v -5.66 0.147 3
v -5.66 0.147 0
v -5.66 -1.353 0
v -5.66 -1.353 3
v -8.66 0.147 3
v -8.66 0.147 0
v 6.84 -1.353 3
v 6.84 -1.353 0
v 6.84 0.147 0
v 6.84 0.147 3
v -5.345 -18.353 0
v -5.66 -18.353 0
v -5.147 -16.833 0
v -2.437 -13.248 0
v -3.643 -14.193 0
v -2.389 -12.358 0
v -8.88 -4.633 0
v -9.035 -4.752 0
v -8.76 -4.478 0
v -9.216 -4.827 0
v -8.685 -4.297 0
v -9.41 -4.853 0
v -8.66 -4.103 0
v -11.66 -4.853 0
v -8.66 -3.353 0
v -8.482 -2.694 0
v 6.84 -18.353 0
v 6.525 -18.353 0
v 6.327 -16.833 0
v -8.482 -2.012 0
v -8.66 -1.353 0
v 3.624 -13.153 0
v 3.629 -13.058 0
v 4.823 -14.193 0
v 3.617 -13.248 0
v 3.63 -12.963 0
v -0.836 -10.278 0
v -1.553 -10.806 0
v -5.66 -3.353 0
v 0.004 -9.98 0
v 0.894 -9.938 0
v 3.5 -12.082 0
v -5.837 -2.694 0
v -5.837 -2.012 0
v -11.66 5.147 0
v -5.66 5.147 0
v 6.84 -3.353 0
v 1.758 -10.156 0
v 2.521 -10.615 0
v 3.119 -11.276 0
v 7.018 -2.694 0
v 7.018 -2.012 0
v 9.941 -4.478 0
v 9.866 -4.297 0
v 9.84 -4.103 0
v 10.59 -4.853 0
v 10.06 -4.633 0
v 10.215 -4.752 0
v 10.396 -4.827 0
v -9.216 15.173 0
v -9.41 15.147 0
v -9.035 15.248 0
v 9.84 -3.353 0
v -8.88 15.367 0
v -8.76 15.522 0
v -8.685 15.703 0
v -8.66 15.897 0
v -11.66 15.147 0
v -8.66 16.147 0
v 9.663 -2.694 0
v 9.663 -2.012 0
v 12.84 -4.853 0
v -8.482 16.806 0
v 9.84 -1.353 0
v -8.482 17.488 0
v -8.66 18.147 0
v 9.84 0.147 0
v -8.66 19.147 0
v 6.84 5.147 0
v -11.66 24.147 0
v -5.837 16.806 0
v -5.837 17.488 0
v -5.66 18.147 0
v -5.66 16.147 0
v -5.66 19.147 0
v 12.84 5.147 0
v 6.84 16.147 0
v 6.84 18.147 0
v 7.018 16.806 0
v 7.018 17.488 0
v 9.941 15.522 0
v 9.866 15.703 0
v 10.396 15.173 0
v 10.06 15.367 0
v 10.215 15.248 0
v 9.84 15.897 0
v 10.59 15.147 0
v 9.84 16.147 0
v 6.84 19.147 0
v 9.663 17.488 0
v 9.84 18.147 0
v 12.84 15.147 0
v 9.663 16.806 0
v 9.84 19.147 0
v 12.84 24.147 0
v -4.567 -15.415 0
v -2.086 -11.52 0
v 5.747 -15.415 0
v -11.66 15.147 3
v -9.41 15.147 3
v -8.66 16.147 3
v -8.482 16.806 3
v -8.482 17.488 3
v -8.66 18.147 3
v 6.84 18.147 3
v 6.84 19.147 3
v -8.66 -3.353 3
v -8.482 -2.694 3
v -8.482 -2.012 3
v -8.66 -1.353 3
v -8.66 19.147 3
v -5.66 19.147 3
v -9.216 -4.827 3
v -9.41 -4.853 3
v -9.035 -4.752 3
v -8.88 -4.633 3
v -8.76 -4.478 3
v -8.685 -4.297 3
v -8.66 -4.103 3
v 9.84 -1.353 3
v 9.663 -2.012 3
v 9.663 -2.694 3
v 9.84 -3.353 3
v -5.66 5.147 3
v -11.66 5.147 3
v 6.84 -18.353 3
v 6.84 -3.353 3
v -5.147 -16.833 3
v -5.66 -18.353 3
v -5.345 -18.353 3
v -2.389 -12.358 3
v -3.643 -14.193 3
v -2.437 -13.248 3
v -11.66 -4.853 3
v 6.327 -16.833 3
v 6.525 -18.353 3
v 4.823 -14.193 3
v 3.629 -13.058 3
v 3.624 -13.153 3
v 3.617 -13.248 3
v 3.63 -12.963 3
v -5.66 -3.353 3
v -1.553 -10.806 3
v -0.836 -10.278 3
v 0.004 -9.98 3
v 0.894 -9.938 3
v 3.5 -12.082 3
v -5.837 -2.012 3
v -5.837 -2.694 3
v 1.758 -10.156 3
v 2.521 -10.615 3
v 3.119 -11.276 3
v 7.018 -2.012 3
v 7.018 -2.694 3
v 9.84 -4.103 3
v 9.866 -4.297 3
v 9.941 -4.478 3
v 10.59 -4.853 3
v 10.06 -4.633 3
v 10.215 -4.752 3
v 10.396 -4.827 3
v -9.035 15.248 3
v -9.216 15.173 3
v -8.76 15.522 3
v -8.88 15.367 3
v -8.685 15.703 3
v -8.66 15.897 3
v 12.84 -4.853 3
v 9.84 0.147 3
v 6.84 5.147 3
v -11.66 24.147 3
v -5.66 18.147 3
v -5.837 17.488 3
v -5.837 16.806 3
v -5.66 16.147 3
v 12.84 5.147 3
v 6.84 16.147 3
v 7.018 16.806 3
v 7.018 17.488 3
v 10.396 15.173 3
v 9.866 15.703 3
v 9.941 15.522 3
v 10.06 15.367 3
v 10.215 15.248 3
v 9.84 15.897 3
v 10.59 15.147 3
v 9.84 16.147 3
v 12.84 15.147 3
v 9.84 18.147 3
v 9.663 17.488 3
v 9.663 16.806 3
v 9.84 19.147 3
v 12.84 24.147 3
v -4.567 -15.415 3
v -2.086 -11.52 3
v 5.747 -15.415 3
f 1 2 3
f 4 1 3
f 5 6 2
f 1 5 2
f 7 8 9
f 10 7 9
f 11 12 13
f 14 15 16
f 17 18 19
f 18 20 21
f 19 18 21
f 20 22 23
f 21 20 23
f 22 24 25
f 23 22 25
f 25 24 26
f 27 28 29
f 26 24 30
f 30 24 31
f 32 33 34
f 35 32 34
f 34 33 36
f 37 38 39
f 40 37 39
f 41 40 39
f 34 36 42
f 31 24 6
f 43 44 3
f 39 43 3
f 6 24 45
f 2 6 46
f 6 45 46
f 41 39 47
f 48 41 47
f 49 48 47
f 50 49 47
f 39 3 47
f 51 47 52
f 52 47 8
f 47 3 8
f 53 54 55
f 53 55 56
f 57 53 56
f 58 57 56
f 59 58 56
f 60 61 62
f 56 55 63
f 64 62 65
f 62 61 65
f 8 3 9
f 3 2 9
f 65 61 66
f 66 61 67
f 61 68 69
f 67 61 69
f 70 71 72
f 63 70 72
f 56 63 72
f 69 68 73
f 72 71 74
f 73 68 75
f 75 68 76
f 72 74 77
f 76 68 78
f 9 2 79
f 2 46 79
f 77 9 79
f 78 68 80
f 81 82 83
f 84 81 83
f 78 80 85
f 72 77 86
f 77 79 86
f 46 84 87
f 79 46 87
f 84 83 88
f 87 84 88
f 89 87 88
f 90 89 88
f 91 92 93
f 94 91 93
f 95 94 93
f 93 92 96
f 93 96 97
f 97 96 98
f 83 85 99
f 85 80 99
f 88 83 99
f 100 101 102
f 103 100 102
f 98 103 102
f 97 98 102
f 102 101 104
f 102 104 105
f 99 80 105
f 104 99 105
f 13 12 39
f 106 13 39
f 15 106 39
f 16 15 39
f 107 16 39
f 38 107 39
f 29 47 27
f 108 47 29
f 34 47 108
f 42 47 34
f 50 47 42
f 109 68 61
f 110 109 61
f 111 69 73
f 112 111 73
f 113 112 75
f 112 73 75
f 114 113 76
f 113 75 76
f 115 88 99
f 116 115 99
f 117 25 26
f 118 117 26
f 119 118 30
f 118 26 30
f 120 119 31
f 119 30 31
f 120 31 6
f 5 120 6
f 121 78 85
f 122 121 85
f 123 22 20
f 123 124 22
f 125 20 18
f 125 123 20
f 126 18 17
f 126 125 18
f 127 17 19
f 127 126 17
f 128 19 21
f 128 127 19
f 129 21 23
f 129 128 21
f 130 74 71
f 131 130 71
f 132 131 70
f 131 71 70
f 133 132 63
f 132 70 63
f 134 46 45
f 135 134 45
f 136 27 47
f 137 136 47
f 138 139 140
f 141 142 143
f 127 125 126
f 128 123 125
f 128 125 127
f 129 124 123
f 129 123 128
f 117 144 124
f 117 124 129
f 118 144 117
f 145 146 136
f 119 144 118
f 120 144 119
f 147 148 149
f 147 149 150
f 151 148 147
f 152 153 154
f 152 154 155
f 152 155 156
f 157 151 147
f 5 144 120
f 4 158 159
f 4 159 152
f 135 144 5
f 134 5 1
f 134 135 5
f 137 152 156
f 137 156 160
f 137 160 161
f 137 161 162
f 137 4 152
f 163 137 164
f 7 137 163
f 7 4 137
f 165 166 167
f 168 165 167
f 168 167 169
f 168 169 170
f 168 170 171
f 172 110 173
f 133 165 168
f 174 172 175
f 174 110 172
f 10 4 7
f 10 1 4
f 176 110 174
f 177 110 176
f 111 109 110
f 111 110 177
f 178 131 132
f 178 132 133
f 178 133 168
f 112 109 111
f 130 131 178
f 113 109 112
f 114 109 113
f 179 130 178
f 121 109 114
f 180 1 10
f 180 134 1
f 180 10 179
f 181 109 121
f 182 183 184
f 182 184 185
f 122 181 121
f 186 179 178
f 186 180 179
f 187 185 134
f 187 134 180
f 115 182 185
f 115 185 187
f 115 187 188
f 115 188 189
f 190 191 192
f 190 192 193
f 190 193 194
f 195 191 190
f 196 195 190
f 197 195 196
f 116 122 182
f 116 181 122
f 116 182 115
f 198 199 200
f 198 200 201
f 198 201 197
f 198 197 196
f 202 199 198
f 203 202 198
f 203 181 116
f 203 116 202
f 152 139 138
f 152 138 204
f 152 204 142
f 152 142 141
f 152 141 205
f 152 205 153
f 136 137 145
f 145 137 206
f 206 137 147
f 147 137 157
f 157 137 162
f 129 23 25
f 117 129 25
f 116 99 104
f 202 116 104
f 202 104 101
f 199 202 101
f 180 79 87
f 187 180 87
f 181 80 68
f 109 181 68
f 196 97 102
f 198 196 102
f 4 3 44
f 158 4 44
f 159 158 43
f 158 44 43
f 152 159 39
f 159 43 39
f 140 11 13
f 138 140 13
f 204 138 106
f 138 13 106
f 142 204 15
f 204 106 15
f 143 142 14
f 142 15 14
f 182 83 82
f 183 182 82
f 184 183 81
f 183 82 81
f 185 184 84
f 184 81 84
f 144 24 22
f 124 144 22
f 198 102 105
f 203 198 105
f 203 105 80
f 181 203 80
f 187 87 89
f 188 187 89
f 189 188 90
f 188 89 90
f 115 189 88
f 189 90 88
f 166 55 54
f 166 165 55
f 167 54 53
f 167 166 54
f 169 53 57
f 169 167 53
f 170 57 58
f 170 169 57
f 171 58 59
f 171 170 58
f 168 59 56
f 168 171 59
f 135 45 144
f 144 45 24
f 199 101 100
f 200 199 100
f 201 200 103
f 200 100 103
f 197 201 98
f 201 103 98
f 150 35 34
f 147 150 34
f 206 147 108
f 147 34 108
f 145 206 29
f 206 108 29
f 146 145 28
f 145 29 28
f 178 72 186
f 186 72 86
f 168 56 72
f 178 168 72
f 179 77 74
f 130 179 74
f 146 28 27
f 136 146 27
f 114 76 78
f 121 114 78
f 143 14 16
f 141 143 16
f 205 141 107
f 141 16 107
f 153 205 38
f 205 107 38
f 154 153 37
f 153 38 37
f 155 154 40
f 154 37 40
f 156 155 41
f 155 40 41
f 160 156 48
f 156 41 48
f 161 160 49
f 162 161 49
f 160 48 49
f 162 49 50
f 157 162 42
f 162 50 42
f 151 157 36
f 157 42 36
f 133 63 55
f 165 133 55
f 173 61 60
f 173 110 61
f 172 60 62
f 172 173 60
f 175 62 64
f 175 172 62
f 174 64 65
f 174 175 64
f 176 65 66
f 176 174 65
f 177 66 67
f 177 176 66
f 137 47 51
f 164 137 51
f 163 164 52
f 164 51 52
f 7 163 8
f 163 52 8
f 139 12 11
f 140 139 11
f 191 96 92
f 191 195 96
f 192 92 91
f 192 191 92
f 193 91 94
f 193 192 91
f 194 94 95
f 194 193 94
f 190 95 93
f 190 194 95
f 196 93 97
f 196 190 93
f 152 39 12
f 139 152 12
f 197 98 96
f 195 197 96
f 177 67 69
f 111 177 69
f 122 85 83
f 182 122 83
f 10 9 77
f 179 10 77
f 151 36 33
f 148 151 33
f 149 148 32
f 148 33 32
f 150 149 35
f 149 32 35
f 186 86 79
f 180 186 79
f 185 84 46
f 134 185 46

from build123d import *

# Parameters (mm, degrees)
BOSS_EXTRUDE1_DEPTH = 3
FILLET1_R           = 0.75


with BuildPart() as part:
    # Sketch1 → Boss-Extrude1 (new body)
    with BuildSketch(Plane.XY):
        with BuildLine():
            Line((12.840070534, 24.147116385), (-11.659929466, 24.147116385))
            Line((-11.659929466, 24.147116385), (-11.659929466, 15.147116385))
            Line((-11.659929466, 15.147116385), (-8.659929466, 15.147116385))
            Line((-8.659929466, 15.147116385), (-8.659929466, 16.147116385))
            ThreePointArc((-8.659929466, 16.147116385), (-8.459929466, 17.147116385), (-8.659929466, 18.147116385))
            Line((-8.659929466, 18.147116385), (-8.659929466, 19.147116385))
            Line((-8.659929466, 19.147116385), (-5.659929466, 19.147116385))
            Line((-5.659929466, 19.147116385), (-5.659929466, 18.147116385))
            ThreePointArc((-5.659929466, 18.147116385), (-5.859929466, 17.147116385), (-5.659929466, 16.147116385))
            Line((-5.659929466, 16.147116385), (-5.659929466, 5.147116385))
            Line((-5.659929466, 5.147116385), (-11.659929466, 5.147116385))
            Line((-11.659929466, 5.147116385), (-11.659929466, -4.852883615))
            Line((-11.659929466, -4.852883615), (-8.659929466, -4.852883615))
            Line((-8.659929466, -4.852883615), (-8.659929466, -3.352883615))
            ThreePointArc((-8.659929466, -3.352883615), (-8.459929466, -2.352883615), (-8.659929466, -1.352883615))
            Line((-8.659929466, -1.352883615), (-8.659929466, 0.147116385))
            Line((-8.659929466, 0.147116385), (-5.659929466, 0.147116385))
            Line((-5.659929466, 0.147116385), (-5.659929466, -1.352883615))
            ThreePointArc((-5.659929466, -1.352883615), (-5.859929466, -2.352883615), (-5.659929466, -3.352883615))
            Line((-5.659929466, -3.352883615), (-5.659929466, -18.352883615))
            Line((-5.659929466, -18.352883615), (-5.344929466, -18.352883615))
            ThreePointArc((-5.344929466, -18.352883615), (-4.566833019, -15.415100311), (-2.436565272, -13.247621556))
            ThreePointArc((-2.436565272, -13.247621556), (0.447544838, -9.926226501), (3.630070534, -12.962883615))
            ThreePointArc((3.630070534, -12.962883615), (3.626727648, -13.105409311), (3.616706341, -13.247621556))
            ThreePointArc((3.616706341, -13.247621556), (5.746974087, -15.415100311), (6.525070534, -18.352883615))
            Line((6.525070534, -18.352883615), (6.840070534, -18.352883615))
            Line((6.840070534, -18.352883615), (6.840070534, -3.352883615))
            ThreePointArc((6.840070534, -3.352883615), (7.040070534, -2.352883615), (6.840070534, -1.352883615))
            Line((6.840070534, -1.352883615), (6.840070534, 0.147116385))
            Line((6.840070534, 0.147116385), (9.840070534, 0.147116385))
            Line((9.840070534, 0.147116385), (9.840070534, -1.352883615))
            ThreePointArc((9.840070534, -1.352883615), (9.640070534, -2.352883615), (9.840070534, -3.352883615))
            Line((9.840070534, -3.352883615), (9.840070534, -4.852883615))
            Line((9.840070534, -4.852883615), (12.840070534, -4.852883615))
            Line((12.840070534, -4.852883615), (12.840070534, 5.147116385))
            Line((12.840070534, 5.147116385), (6.840070534, 5.147116385))
            Line((6.840070534, 5.147116385), (6.840070534, 16.147116385))
            ThreePointArc((6.840070534, 16.147116385), (7.040070534, 17.147116385), (6.840070534, 18.147116385))
            Line((6.840070534, 18.147116385), (6.840070534, 19.147116385))
            Line((6.840070534, 19.147116385), (9.840070534, 19.147116385))
            Line((9.840070534, 19.147116385), (9.840070534, 18.147116385))
            ThreePointArc((9.840070534, 18.147116385), (9.640070534, 17.147116385), (9.840070534, 16.147116385))
            Line((9.840070534, 16.147116385), (9.840070534, 15.147116385))
            Line((9.840070534, 15.147116385), (12.840070534, 15.147116385))
            Line((12.840070534, 15.147116385), (12.840070534, 24.147116385))
        make_face()
    extrude(amount=BOSS_EXTRUDE1_DEPTH)

    # Fillet1
    fillet1_edges = [part.edges().sort_by_distance(p)[0] for p in [
        (-8.659929466, 15.147116385, 1.5),
        (9.840070534, 15.147116385, 1.5),
        (9.840070534, -4.852883615, 1.5),
        (-8.659929466, -4.852883615, 1.5),
    ]]
    fillet(fillet1_edges, radius=FILLET1_R)


solid = part.part
